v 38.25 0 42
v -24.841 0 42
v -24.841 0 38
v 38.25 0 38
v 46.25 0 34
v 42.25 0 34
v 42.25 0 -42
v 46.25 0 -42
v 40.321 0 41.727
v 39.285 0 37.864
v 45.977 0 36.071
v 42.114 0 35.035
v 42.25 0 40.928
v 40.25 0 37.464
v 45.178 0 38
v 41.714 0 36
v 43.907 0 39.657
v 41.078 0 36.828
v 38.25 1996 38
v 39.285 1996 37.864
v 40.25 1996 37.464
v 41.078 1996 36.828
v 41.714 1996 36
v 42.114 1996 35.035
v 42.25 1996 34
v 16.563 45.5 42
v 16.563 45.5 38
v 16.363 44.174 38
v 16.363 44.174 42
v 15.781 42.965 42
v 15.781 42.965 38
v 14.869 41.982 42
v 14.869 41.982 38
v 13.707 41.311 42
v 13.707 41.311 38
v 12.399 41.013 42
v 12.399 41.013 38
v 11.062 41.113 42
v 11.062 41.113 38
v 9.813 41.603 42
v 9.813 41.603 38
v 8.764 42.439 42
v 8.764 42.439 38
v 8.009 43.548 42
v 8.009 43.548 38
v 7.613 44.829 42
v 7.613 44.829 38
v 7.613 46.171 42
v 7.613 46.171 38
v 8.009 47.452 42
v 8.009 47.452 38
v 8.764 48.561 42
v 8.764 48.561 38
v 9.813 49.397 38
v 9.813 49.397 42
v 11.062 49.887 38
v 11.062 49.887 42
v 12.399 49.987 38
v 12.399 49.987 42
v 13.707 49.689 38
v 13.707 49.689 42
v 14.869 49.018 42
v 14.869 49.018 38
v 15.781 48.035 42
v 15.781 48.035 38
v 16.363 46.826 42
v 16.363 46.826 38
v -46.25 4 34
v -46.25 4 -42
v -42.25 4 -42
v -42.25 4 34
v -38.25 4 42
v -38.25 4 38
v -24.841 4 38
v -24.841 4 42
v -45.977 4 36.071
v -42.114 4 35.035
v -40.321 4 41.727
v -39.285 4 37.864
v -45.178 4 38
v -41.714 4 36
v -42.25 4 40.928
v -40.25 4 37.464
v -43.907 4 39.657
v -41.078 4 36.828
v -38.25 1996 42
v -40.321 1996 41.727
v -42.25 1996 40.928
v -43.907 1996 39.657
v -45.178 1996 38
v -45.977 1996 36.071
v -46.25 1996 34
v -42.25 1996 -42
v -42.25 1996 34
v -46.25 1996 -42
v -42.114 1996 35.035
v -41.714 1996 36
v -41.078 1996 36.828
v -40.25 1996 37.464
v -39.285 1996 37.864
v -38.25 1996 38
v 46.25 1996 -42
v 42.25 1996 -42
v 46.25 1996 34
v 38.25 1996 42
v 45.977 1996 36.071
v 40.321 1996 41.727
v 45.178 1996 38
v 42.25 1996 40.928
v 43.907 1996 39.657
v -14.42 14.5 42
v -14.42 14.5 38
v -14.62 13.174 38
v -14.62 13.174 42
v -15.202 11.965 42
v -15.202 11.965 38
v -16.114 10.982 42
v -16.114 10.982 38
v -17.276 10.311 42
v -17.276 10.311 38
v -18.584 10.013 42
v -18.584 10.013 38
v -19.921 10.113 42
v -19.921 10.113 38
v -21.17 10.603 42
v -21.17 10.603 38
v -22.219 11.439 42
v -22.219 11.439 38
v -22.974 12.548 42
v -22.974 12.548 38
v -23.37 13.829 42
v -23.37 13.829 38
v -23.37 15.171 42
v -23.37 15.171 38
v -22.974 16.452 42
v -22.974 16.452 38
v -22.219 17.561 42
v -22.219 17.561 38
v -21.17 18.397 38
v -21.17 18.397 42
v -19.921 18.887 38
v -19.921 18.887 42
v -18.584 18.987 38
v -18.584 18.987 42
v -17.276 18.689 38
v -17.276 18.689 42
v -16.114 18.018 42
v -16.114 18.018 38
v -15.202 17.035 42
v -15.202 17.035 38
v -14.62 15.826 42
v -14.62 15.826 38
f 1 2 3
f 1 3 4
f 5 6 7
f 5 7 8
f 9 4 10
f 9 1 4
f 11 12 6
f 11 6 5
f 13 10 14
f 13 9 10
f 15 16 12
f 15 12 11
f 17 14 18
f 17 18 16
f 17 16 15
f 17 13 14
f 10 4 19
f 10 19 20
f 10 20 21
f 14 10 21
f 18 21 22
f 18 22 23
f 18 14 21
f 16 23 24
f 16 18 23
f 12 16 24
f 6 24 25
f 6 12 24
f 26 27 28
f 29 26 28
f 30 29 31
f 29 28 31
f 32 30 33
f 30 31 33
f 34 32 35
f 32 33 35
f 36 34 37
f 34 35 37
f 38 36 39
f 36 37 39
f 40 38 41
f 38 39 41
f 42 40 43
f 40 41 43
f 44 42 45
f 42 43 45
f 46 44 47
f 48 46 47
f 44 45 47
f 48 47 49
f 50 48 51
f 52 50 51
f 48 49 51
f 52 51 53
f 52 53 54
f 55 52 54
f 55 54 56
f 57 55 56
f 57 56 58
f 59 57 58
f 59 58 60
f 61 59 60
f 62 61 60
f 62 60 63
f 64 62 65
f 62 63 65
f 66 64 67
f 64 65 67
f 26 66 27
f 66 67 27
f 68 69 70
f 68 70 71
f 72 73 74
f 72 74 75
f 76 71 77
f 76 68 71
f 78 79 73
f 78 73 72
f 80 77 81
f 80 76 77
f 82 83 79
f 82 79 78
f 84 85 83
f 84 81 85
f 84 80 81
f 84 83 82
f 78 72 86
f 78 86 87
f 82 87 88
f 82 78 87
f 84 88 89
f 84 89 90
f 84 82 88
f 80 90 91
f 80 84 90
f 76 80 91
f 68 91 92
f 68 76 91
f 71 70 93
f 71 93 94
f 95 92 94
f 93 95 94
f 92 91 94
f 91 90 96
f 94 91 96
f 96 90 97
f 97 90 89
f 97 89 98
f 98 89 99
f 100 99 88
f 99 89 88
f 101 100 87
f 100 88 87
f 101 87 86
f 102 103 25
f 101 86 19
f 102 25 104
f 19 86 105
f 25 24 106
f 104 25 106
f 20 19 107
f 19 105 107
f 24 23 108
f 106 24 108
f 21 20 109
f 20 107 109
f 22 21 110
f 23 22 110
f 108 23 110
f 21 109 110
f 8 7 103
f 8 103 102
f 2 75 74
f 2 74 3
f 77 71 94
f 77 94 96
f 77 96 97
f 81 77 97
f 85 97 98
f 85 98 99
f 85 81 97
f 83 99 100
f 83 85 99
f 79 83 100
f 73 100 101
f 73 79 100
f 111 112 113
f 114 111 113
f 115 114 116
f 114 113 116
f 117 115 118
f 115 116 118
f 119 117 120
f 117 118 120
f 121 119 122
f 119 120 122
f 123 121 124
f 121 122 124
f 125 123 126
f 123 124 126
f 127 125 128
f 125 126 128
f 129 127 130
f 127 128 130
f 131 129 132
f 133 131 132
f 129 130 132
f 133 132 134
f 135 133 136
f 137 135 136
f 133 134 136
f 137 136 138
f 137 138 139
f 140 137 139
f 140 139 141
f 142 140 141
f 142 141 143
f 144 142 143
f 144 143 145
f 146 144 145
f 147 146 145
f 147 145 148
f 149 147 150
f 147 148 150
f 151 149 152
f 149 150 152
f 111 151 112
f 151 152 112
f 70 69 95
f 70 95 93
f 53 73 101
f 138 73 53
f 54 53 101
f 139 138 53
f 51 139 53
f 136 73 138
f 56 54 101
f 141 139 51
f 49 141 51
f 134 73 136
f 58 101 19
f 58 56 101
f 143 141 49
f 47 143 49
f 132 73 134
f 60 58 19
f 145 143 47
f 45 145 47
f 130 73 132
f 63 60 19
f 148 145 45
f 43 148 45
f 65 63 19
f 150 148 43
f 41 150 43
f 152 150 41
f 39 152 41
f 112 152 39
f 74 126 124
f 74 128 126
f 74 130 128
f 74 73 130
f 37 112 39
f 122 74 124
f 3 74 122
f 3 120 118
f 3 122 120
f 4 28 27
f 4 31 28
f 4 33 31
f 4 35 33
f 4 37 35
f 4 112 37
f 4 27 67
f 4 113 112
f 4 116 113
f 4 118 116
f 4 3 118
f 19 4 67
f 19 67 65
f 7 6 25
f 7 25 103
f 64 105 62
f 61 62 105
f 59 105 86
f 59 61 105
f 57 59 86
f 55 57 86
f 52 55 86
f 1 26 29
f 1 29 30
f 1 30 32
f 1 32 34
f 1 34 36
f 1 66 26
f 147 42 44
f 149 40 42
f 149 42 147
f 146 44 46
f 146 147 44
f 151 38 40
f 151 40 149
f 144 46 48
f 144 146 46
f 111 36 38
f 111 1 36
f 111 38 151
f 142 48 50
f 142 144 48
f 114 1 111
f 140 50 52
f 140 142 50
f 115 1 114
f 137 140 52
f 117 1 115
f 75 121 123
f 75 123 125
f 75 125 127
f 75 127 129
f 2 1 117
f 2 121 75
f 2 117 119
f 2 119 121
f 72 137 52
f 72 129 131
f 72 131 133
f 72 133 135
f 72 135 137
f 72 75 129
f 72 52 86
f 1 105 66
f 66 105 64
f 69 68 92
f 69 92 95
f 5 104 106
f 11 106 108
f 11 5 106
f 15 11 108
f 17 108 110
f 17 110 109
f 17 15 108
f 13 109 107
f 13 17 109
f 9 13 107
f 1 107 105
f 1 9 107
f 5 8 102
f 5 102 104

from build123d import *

# Parameters (mm, degrees)
F1_DEPTH = 1996
F3_W     = 4
F3_H     = 87
F4_DEPTH = 21.409
F6_R     = 4.5
F5_R     = 4.5
F7_DEPTH = 4


with BuildPart() as f1:
    # F0 (on Front) → F1 (new body)
    with BuildSketch(Plane.XZ):
        with BuildLine():
            Line((-46.25, 34), (-46.25, -42))
            Line((-46.25, -42), (-42.25, -42))
            Line((-42.25, -42), (-42.25, 34))
            ThreePointArc((-42.25, 34), (-41.078427, 36.828427), (-38.25, 38))
            Line((-38.25, 38), (38.25, 38))
            ThreePointArc((38.25, 38), (41.078427, 36.828427), (42.25, 34))
            Line((42.25, 34), (42.25, -42))
            Line((42.25, -42), (46.25, -42))
            Line((46.25, -42), (46.25, 34))
            ThreePointArc((46.25, 34), (43.906854, 39.656854), (38.25, 42))
            Line((38.25, 42), (-38.25, 42))
            ThreePointArc((-38.25, 42), (-43.906854, 39.656854), (-46.25, 34))
        make_face()
    extrude(amount=-F1_DEPTH)

    # F3 (on face) → F4 (cut)
    with BuildSketch(Plane(origin=(-46.25, 0, 0), x_dir=(0, -1, 0), z_dir=(-1, 0, 0))):
        with Locations((-2, 0.370724)):
            Rectangle(F3_W, F3_H)
    extrude(amount=-F4_DEPTH, mode=Mode.SUBTRACT)

    # F6 (on face) + F5 (on face) → F7 (cut)
    with BuildSketch(Plane(origin=(0, 0, 38), x_dir=(1, 0, 0), z_dir=(0, 0, -1))):
        with Locations((12.063, -45.5)):
            Circle(F6_R)
    with BuildSketch(Plane(origin=(0, 0, 38), x_dir=(1, 0, 0), z_dir=(0, 0, -1))):
        with Locations((-18.92, -14.5)):
            Circle(F5_R)
    extrude(amount=-F7_DEPTH, mode=Mode.SUBTRACT)


solid = f1.part
